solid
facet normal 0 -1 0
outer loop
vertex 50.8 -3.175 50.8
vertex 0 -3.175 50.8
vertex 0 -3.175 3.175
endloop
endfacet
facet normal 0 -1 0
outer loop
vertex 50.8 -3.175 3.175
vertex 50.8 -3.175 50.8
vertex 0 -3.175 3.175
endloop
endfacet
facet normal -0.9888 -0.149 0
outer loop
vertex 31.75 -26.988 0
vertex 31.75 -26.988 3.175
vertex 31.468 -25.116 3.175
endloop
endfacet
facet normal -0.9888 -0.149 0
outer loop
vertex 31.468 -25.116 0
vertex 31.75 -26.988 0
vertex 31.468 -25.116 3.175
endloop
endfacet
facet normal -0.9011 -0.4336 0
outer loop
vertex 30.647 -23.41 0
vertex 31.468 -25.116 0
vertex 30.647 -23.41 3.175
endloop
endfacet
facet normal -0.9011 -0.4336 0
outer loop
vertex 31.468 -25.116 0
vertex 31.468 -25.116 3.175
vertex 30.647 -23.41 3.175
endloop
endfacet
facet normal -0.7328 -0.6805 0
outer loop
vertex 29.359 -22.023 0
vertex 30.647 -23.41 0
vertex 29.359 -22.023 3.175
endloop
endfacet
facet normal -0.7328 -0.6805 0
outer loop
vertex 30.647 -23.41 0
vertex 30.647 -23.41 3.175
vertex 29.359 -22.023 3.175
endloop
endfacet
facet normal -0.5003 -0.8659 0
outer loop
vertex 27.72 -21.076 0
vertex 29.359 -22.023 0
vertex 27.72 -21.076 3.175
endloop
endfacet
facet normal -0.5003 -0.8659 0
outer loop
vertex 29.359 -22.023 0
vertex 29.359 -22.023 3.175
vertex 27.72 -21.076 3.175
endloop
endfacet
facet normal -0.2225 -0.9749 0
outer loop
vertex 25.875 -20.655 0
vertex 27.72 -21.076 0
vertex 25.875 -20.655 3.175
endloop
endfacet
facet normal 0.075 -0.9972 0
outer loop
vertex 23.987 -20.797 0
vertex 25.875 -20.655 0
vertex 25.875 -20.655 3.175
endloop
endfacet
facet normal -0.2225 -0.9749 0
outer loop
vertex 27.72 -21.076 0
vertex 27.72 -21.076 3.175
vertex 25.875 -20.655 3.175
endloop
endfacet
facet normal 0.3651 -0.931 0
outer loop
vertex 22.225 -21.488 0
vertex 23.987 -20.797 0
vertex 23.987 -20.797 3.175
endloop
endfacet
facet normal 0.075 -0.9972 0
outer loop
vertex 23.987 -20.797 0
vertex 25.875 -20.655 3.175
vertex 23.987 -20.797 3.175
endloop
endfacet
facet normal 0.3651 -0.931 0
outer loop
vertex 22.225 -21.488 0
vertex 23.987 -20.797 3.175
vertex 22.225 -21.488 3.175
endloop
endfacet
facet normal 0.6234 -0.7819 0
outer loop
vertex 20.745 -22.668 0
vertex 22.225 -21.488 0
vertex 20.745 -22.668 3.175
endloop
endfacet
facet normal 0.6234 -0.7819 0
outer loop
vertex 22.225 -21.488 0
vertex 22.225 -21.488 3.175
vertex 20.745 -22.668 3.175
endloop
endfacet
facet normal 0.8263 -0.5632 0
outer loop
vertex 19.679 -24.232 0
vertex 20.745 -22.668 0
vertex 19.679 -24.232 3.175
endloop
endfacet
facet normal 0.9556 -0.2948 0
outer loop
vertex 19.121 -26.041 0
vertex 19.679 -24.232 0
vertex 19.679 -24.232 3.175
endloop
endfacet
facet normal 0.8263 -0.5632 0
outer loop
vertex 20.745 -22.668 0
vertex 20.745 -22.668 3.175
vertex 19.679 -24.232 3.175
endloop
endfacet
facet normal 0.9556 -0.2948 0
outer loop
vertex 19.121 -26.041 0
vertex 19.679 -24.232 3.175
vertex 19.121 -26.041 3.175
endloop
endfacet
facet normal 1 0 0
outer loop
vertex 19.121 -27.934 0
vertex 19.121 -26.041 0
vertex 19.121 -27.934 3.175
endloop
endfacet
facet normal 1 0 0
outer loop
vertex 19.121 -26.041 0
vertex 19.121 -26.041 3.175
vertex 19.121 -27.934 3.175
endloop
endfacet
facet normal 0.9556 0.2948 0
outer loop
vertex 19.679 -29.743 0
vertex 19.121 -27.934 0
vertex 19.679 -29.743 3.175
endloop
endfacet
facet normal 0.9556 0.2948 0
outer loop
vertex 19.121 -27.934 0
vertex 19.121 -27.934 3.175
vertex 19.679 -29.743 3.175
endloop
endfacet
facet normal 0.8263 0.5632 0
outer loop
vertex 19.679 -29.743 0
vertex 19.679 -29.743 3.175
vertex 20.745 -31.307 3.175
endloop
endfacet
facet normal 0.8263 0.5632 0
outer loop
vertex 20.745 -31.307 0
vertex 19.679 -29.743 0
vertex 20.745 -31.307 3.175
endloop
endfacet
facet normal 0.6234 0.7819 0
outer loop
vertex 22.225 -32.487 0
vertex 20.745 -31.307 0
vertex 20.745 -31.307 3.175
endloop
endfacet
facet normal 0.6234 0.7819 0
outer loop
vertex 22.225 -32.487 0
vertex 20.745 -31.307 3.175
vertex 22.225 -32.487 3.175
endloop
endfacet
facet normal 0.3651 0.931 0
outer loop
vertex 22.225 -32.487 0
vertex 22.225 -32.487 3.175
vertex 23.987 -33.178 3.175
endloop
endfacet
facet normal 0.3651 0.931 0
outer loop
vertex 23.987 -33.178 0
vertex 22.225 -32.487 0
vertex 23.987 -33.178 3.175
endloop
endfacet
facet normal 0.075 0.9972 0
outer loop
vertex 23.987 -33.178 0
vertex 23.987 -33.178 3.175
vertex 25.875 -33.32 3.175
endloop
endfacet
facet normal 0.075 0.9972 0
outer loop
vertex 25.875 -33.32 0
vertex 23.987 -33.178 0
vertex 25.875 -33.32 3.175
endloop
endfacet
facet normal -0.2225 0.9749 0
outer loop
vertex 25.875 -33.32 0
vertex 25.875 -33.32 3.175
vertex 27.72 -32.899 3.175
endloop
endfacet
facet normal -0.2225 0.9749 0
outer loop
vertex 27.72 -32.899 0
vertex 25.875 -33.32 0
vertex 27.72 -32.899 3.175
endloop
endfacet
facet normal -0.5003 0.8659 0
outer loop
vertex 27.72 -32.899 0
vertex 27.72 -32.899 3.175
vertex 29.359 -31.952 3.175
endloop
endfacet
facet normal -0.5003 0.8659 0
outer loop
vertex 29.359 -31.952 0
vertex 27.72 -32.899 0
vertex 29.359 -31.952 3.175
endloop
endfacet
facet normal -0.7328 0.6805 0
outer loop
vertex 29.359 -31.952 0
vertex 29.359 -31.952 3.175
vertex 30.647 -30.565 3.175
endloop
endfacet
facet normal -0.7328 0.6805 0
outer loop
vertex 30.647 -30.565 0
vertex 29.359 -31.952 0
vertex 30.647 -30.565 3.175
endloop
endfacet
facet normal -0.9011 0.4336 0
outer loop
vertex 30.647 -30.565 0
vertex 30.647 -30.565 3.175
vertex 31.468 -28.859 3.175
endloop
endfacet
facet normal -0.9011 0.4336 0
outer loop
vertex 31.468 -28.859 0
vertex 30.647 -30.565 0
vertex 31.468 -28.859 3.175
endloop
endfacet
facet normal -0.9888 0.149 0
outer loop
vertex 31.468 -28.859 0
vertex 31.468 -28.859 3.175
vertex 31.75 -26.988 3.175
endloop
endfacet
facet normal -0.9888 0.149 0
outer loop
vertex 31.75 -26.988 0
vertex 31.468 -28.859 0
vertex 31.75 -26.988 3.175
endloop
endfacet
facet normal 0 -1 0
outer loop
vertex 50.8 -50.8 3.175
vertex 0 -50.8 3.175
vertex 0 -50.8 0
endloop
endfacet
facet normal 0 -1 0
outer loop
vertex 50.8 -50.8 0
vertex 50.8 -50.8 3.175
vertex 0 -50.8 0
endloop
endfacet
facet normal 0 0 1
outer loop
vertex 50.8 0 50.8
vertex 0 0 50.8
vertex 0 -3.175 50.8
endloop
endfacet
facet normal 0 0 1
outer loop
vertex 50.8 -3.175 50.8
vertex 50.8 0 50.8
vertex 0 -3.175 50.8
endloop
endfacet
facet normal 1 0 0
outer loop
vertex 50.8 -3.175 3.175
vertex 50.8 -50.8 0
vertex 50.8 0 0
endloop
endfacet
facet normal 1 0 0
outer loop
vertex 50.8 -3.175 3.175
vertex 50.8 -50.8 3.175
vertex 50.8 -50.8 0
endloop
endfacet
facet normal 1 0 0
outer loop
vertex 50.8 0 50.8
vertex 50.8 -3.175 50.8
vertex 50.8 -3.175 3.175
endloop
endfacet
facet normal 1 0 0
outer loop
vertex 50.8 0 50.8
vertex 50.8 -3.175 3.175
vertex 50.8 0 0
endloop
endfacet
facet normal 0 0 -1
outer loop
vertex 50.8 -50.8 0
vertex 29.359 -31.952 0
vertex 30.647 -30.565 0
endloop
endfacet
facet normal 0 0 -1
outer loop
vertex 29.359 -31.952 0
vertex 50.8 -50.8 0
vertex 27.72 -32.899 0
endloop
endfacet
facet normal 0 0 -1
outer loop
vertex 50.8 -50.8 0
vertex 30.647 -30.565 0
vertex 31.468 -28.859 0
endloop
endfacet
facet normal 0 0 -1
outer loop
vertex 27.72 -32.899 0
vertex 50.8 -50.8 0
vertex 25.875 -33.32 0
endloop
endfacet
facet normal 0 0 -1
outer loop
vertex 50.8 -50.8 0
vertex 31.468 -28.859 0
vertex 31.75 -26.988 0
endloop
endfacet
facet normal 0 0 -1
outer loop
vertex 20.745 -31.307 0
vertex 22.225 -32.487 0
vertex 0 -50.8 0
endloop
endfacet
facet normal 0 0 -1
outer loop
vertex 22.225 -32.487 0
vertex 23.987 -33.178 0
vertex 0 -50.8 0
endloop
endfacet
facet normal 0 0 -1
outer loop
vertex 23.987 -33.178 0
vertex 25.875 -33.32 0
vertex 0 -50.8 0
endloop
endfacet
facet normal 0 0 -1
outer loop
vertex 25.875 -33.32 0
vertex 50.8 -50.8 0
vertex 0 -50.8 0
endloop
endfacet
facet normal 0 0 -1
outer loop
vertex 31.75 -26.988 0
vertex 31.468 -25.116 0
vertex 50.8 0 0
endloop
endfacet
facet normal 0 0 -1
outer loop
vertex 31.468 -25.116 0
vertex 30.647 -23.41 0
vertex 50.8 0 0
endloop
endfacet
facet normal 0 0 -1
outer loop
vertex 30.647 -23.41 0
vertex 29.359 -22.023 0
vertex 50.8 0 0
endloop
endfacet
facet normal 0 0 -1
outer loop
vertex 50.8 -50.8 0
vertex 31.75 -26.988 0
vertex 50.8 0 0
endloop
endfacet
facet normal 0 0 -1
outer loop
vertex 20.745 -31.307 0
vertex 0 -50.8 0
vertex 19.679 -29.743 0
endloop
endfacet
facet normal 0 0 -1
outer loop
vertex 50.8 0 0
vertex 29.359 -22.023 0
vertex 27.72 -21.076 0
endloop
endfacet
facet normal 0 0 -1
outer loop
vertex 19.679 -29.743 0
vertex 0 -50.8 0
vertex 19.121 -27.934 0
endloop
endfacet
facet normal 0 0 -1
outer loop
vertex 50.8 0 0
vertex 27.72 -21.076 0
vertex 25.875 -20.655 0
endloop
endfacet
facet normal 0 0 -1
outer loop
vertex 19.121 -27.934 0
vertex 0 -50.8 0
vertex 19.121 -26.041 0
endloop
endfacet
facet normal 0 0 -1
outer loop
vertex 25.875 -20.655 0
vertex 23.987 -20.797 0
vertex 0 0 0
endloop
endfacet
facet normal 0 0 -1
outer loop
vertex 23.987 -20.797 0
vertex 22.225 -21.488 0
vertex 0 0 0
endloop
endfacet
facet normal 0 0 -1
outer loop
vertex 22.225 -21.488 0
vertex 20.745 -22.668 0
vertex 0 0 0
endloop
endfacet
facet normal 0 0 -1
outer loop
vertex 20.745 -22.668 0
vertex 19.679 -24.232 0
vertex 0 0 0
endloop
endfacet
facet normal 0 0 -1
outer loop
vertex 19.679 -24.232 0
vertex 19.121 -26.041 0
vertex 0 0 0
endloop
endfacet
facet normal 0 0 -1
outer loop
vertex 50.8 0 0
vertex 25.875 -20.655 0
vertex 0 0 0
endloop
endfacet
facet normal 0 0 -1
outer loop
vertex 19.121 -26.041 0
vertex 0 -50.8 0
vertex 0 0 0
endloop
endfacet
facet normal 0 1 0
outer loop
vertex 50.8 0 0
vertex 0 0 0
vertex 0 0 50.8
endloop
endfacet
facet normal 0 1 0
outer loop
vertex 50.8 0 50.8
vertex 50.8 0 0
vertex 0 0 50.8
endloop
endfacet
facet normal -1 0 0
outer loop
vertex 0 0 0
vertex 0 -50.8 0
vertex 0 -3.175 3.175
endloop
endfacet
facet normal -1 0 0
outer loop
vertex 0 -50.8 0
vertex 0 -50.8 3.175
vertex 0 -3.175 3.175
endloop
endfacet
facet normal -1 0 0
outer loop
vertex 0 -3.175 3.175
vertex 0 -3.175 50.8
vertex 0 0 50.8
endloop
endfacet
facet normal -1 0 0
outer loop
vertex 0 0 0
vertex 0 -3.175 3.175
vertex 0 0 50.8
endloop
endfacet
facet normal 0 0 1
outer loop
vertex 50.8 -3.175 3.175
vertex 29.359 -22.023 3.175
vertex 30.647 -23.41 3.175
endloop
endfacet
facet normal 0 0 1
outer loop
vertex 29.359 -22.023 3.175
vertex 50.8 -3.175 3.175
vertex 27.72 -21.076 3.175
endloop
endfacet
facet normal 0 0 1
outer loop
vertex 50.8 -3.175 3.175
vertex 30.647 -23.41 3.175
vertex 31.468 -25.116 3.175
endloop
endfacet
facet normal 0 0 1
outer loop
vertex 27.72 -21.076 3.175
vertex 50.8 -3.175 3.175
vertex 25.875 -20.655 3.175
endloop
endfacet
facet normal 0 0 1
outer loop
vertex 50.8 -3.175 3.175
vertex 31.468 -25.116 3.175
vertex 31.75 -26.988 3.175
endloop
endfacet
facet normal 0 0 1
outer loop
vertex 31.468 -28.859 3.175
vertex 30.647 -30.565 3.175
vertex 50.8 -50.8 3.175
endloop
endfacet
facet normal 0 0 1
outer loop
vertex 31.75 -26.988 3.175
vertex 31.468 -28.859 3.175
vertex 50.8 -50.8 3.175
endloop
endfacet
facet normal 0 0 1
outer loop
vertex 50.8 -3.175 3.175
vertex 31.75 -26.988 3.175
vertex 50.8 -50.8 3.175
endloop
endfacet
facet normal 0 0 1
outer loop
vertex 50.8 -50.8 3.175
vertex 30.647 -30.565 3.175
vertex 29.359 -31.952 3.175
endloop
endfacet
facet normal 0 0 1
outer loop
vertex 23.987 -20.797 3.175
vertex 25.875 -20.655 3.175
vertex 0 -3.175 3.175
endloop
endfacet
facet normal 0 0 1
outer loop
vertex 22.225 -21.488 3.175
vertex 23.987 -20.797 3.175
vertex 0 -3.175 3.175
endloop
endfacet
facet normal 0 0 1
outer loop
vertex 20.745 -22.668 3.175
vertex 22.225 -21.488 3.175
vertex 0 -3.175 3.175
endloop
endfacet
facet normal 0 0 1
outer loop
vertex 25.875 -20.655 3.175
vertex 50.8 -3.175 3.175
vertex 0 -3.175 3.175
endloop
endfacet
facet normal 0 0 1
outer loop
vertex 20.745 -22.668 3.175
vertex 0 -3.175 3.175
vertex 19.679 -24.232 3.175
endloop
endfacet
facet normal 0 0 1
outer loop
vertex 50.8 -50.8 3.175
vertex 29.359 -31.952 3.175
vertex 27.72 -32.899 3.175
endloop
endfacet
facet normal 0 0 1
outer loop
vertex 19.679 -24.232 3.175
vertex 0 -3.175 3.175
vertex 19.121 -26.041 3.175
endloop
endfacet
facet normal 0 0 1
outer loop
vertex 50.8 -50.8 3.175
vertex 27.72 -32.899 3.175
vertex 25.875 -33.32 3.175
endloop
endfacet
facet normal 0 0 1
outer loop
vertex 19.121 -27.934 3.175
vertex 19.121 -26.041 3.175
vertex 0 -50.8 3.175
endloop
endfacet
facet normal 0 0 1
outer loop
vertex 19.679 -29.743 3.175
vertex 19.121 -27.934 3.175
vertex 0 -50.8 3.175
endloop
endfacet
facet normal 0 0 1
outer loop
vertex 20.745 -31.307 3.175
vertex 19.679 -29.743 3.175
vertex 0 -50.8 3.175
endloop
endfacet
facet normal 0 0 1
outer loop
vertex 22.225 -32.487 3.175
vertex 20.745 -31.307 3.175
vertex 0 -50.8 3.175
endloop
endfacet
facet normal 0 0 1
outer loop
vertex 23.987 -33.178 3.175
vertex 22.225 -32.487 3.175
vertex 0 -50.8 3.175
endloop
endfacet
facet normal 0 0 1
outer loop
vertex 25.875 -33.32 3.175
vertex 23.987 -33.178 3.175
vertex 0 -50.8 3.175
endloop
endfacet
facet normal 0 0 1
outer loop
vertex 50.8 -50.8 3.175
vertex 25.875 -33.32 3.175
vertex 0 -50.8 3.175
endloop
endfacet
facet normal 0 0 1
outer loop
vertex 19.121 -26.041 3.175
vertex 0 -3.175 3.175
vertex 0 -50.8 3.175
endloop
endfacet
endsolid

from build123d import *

# Parameters (mm, degrees)
F1_DEPTH = 50.8
F2_R     = 6.35
F3_DEPTH = 25.4


with BuildPart() as f1:
    # F0 (on Right) → F1 (new body)
    with BuildSketch(Plane.YZ):
        Polygon((-50.8, 0), (0, 0), (0, 50.8), (-3.175, 50.8), (-3.175, 3.175), (-50.8, 3.175), align=None)
    extrude(amount=F1_DEPTH)

    # F2 (on face) → F3 (cut)
    with BuildSketch(Plane.XY.offset(3.175)):
        with Locations((25.4, -26.9875)):
            Circle(F2_R)
    extrude(amount=-F3_DEPTH, mode=Mode.SUBTRACT)


solid = f1.part
